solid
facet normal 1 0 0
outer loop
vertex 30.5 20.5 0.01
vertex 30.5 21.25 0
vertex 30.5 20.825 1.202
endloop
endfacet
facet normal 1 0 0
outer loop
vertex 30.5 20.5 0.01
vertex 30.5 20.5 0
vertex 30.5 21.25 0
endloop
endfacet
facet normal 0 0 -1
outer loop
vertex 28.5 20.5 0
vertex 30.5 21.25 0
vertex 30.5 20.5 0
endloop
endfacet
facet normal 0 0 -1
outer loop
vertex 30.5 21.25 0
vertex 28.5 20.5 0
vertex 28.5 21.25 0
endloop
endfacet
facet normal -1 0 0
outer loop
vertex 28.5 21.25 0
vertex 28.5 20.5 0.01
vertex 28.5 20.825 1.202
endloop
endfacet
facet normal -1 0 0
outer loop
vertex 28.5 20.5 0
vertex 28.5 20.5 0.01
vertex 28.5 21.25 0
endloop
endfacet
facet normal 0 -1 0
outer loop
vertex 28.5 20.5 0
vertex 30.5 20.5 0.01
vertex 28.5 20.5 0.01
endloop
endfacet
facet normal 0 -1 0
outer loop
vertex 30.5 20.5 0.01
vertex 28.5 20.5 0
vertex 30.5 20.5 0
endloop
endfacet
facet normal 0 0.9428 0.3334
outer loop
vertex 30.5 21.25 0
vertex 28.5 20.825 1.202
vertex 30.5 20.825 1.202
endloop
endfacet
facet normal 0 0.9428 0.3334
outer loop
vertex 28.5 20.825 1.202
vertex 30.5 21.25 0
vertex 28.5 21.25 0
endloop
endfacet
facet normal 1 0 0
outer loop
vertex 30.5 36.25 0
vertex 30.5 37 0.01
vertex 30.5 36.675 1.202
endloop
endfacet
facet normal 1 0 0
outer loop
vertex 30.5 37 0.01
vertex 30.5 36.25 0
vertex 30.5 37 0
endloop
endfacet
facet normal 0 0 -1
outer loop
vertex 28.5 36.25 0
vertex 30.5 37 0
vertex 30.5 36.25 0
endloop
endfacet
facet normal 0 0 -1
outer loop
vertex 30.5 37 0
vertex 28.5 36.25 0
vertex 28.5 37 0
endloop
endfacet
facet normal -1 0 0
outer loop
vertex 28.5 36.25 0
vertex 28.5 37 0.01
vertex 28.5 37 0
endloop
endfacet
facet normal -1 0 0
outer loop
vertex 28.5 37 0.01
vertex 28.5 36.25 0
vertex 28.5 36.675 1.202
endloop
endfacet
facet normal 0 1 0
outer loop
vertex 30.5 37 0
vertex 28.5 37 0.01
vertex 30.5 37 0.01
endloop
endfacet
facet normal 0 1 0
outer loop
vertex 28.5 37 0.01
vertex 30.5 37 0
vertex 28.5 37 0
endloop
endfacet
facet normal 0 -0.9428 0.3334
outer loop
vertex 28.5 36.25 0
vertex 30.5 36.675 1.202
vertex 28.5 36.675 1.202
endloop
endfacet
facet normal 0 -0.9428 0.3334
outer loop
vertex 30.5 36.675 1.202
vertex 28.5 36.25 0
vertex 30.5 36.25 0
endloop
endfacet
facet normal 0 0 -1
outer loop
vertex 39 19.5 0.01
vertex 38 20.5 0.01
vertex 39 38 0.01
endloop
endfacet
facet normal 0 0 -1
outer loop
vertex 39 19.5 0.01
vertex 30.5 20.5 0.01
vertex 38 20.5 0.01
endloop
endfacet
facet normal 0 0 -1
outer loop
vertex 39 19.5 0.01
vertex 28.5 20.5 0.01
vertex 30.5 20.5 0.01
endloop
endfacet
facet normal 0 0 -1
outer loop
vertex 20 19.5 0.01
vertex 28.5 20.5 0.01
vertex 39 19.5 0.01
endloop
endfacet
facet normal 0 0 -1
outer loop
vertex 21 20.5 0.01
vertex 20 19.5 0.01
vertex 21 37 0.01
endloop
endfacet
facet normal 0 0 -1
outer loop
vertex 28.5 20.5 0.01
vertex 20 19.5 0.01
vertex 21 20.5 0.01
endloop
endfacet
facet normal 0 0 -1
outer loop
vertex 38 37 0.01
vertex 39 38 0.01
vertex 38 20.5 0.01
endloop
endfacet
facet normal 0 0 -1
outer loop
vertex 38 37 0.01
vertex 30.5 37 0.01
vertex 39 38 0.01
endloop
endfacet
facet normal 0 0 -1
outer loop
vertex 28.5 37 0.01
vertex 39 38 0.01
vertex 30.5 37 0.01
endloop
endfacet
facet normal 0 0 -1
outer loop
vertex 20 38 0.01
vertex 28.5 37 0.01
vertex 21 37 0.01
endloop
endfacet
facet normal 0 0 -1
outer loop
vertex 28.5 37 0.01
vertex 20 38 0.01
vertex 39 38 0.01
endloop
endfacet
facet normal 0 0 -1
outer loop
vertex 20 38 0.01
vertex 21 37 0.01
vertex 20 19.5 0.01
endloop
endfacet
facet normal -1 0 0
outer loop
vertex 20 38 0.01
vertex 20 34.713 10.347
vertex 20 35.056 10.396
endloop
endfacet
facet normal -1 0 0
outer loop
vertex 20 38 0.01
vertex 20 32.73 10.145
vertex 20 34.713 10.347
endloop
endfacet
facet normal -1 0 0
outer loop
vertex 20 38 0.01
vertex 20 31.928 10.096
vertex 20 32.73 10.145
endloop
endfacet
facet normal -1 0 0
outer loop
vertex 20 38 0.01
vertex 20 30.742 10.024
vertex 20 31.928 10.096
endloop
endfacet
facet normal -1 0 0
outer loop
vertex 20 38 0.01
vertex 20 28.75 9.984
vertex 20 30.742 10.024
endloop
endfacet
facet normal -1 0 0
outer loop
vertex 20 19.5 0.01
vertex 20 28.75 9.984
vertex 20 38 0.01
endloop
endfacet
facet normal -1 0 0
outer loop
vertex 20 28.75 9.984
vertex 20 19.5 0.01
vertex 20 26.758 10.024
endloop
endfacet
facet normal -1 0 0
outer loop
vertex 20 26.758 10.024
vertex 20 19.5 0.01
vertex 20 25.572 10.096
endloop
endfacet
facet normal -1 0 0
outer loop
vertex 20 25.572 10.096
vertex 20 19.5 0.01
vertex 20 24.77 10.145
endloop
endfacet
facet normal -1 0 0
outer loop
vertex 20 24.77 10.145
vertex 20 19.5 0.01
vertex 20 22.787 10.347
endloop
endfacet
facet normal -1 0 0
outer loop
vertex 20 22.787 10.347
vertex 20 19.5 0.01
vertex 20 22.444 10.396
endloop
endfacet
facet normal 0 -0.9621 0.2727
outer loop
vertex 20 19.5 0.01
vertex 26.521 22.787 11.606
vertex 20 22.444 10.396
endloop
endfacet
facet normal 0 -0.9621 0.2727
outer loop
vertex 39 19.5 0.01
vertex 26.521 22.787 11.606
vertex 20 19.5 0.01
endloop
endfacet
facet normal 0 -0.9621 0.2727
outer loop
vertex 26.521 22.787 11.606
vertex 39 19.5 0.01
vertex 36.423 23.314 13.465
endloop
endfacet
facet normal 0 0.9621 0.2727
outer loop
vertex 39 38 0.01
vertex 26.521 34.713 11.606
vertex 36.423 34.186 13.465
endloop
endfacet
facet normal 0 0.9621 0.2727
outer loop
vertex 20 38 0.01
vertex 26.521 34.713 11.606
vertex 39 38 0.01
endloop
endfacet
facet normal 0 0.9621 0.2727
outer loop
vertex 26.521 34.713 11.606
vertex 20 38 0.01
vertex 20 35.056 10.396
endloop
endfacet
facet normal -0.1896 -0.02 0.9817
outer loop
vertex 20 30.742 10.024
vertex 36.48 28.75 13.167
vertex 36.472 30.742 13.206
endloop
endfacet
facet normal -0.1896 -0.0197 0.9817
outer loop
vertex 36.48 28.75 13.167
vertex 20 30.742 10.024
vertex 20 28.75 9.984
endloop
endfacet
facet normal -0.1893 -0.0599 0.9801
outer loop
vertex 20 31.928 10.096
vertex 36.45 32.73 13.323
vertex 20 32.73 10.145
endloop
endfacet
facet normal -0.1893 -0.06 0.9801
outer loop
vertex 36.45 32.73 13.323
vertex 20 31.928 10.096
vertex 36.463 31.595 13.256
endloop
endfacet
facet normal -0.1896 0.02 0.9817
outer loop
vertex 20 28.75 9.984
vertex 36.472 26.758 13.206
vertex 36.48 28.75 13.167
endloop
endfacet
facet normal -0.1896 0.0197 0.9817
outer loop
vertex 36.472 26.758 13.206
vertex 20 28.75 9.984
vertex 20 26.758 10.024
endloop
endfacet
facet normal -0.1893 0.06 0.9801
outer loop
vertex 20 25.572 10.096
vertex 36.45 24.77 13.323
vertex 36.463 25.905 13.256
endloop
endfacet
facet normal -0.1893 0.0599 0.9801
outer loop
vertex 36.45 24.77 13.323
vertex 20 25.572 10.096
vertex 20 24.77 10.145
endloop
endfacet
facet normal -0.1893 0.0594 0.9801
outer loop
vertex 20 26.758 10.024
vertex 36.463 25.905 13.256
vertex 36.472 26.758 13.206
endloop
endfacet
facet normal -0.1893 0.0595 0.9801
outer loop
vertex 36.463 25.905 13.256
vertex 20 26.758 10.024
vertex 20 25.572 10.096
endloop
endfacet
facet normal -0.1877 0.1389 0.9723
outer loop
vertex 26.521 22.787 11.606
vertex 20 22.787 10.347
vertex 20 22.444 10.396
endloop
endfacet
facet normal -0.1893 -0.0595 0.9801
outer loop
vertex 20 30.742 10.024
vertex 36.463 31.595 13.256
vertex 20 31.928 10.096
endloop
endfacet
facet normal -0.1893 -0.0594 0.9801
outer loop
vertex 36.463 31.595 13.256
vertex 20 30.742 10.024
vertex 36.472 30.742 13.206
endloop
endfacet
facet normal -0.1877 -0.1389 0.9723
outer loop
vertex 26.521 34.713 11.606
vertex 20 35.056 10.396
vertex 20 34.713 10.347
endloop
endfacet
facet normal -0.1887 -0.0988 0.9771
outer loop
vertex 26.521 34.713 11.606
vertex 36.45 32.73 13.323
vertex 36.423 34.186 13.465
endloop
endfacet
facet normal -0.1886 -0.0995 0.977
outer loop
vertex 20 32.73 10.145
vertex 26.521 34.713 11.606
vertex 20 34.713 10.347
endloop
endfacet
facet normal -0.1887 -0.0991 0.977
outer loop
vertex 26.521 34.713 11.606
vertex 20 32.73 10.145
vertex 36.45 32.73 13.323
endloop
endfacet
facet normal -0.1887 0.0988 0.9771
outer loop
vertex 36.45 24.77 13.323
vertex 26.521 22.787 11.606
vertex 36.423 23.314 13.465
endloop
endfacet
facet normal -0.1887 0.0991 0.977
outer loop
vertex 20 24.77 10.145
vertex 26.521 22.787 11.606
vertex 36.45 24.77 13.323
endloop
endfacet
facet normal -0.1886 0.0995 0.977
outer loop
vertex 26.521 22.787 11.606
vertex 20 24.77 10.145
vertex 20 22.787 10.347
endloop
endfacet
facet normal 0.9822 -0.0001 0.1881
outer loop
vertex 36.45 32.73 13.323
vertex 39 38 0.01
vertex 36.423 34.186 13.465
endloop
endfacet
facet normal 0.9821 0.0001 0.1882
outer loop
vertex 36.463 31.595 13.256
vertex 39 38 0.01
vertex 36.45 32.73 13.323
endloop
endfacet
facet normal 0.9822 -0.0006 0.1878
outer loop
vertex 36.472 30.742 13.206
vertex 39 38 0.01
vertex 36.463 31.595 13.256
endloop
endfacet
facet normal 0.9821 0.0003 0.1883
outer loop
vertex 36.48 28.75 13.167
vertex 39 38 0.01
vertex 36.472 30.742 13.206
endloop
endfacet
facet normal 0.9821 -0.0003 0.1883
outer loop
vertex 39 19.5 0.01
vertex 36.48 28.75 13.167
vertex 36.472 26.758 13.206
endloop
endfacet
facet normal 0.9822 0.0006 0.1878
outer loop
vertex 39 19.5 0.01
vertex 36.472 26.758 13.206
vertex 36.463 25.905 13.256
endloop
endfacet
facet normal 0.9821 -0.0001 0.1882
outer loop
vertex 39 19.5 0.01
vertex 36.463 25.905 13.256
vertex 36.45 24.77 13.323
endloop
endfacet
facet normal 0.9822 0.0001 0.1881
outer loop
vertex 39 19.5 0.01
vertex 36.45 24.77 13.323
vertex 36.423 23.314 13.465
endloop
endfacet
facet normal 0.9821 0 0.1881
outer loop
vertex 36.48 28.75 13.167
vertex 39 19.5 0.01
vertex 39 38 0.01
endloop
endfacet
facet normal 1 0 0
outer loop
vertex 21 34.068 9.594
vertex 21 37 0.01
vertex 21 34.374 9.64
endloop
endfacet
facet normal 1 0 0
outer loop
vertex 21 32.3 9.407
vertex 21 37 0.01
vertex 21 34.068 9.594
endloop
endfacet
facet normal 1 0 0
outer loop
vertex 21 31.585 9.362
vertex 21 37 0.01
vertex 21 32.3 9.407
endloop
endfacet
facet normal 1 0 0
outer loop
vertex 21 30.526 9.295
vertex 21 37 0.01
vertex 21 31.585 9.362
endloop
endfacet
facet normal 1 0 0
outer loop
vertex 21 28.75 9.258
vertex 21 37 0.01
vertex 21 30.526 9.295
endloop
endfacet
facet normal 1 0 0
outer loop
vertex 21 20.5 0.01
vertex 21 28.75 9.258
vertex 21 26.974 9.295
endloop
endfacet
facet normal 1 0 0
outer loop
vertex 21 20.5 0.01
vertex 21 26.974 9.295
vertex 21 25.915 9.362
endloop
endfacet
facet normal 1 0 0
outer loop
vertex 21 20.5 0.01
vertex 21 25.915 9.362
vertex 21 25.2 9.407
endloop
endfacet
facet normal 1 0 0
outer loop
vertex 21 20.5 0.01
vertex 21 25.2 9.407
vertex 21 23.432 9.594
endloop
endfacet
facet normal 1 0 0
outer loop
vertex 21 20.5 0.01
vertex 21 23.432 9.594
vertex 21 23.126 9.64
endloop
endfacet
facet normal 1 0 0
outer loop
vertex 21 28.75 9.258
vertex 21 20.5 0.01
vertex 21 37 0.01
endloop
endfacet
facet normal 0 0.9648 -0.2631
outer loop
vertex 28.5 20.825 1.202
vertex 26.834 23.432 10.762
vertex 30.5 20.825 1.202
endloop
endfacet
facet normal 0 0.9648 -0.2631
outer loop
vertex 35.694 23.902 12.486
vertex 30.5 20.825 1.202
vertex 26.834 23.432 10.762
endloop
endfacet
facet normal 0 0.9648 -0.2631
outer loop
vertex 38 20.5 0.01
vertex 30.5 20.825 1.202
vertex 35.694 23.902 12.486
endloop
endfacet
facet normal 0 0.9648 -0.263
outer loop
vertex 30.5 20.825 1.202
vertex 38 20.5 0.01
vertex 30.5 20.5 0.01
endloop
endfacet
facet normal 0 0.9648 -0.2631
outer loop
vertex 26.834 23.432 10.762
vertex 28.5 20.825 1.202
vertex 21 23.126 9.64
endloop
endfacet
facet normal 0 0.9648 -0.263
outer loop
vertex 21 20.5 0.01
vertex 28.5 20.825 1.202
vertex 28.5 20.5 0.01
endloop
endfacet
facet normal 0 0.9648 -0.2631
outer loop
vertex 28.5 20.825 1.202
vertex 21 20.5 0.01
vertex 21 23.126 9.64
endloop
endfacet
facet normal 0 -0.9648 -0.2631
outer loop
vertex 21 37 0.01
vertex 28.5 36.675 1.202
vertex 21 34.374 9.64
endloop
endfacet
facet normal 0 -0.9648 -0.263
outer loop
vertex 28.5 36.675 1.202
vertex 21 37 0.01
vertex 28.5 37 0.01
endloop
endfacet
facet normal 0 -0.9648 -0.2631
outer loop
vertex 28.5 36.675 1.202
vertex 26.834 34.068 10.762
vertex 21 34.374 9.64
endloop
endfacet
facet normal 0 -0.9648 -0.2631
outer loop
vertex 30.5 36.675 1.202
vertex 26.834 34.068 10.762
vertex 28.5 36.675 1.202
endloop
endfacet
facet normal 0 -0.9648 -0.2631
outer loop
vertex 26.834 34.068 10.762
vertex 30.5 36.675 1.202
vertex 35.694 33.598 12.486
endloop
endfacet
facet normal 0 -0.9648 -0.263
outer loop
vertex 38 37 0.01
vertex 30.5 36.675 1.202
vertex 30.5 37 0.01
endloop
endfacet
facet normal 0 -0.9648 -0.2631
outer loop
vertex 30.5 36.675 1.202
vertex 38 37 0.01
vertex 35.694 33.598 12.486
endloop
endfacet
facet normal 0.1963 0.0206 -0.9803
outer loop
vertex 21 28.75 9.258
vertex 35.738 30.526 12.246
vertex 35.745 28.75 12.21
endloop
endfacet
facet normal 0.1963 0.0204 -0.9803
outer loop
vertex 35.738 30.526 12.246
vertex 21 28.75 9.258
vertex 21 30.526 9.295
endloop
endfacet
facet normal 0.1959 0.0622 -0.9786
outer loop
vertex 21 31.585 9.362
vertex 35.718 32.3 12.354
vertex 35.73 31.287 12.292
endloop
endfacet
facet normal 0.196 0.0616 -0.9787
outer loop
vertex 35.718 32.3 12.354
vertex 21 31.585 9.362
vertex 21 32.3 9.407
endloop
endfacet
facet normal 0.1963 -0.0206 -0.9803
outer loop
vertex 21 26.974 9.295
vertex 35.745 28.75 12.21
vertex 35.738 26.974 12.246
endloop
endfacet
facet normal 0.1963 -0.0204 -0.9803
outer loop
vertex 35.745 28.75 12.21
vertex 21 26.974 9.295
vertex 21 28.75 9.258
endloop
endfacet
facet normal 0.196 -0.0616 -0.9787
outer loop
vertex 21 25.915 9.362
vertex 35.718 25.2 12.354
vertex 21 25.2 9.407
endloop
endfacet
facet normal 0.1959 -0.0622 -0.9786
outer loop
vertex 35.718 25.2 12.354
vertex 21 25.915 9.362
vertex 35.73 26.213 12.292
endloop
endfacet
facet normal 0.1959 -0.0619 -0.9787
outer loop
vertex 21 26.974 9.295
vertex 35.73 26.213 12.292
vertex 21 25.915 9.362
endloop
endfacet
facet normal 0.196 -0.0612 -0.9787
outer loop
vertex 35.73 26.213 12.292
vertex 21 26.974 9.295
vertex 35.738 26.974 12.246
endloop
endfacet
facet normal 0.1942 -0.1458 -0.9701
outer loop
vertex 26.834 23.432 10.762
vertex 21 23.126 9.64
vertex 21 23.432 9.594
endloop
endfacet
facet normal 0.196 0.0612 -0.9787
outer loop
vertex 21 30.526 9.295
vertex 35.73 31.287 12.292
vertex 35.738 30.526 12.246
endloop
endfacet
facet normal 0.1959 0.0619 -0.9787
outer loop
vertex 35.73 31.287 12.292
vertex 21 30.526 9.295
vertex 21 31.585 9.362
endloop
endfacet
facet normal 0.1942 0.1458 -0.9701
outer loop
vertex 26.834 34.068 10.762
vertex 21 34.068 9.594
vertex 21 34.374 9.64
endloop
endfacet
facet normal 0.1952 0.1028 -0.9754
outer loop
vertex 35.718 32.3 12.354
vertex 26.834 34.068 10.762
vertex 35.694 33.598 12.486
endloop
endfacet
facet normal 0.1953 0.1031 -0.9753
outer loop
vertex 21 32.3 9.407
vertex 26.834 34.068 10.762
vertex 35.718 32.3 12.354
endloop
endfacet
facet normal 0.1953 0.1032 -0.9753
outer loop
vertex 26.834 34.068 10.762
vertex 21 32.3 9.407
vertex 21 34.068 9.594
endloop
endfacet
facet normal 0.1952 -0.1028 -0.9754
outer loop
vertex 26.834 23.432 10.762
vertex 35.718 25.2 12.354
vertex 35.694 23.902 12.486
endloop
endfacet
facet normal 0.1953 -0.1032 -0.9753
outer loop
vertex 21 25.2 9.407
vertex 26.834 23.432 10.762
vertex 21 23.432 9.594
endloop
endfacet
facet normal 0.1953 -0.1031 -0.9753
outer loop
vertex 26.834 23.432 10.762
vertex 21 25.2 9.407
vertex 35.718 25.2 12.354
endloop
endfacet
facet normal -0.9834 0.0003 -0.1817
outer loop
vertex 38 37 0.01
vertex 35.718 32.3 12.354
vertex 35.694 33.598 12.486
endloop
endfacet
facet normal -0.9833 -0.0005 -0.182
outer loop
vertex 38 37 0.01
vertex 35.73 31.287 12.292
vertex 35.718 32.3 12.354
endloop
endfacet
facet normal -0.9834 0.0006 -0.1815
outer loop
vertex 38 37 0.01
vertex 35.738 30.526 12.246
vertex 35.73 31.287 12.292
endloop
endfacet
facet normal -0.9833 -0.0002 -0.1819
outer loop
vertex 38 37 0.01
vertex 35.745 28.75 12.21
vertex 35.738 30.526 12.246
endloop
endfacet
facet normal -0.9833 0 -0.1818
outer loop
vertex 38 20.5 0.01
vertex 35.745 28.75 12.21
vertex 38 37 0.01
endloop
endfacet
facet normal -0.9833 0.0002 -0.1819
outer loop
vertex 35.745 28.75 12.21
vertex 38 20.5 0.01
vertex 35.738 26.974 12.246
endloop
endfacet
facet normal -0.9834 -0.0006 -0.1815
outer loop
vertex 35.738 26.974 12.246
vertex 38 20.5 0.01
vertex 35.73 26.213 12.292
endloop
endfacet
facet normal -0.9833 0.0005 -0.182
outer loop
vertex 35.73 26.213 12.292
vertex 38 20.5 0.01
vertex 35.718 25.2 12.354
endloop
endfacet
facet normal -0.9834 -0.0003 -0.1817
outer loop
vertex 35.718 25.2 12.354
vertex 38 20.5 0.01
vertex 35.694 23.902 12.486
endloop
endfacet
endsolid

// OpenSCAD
//measures are in millimeters
// Support not needed
// 210°   hotend
// 70°    bed
// 0.1    resolution
// 20mm/s speed
// 100%   infill
// Geeetech PLA
AY=18.5;
AX=19.0;
BY=12.5;
BLX=14.5;
EZ=11.0;
FLZ=14.0;
H=13.75;    //we need 1mm more
CYL_OFF_Z=50;
CYL_DEPTH=0.1;
CLIP_X=2;
CLIP_Y=0.75;
CLIP_H=3*CLIP_Y;
CORNER_RADIUS=0;    // we don't want 

WallThickness=1.00;
ClipWidth=2.2;
ClipDepth=1.0;

//ascfront=FLZ/sqrt(pow(FLZ,2)-pow(H,2));
//asctop=(H-EZ)/sqrt(pow(BLX,2)-pow((H-EZ),2));

alpha=asin((H-EZ)/BLX);
beta=asin(H/FLZ);
gamma=90-asin((0.5*(AY-BY))/EZ);

module keycap(){
	scale([AX/(AX+2*CORNER_RADIUS),AY/(AY+2*CORNER_RADIUS),1])
	translate([CORNER_RADIUS,CORNER_RADIUS,0.01])
	minkowski(){
		difference(){
			cube([AX,AY,H]);
			rotate(a=gamma,v=[1,0,0]) cube([100,100,100]);
			translate([0,AY,0]) rotate(a=90-gamma,v=[1,0,0]) cube([100,100,100]);
			translate([0,0,EZ]) rotate(a=-alpha,v=[0,1,0]) translate([-50,0,0]) cube([100,100,100]);
			translate([0,AY/2,EZ+CYL_OFF_Z]) rotate(a=90-alpha,v=[0,1,0]) cylinder(h=100,center=true,r=CYL_OFF_Z+CYL_DEPTH,$fa=1);
			translate([AX,0,0]) rotate(a=beta-90,v=[0,1,0]) cube([100,100,100]);
		}
		cylinder(h=0.10,r=CORNER_RADIUS,$fs=0.6);
		//rotate(a=90,v=[1,0,0]) cylinder(h=0.01,r=1,$fs=0.6);
	}
}

module clip(){
	difference(){
		cube([CLIP_X,CLIP_Y,CLIP_H]);
		translate([0,CLIP_Y,0]) rotate(a=asin(CLIP_Y/CLIP_H),v=[1,0,0]) cube([100,100,100]);
	}
}

i=1;
j=1;
translate([i*(AX+WallThickness),j*(AY+WallThickness),0]){

translate([(AX-CLIP_X)/2,WallThickness,0]) clip();
translate([0,AY,0]) mirror([0,1,0]) translate([(AX-CLIP_X)/2,WallThickness,0]) clip();

difference(){
	keycap();
	translate([WallThickness, WallThickness, 0]) scale(v=[1-2*WallThickness/AX, 1-2*WallThickness/AY, 1-WallThickness/H]) keycap();
}
}
